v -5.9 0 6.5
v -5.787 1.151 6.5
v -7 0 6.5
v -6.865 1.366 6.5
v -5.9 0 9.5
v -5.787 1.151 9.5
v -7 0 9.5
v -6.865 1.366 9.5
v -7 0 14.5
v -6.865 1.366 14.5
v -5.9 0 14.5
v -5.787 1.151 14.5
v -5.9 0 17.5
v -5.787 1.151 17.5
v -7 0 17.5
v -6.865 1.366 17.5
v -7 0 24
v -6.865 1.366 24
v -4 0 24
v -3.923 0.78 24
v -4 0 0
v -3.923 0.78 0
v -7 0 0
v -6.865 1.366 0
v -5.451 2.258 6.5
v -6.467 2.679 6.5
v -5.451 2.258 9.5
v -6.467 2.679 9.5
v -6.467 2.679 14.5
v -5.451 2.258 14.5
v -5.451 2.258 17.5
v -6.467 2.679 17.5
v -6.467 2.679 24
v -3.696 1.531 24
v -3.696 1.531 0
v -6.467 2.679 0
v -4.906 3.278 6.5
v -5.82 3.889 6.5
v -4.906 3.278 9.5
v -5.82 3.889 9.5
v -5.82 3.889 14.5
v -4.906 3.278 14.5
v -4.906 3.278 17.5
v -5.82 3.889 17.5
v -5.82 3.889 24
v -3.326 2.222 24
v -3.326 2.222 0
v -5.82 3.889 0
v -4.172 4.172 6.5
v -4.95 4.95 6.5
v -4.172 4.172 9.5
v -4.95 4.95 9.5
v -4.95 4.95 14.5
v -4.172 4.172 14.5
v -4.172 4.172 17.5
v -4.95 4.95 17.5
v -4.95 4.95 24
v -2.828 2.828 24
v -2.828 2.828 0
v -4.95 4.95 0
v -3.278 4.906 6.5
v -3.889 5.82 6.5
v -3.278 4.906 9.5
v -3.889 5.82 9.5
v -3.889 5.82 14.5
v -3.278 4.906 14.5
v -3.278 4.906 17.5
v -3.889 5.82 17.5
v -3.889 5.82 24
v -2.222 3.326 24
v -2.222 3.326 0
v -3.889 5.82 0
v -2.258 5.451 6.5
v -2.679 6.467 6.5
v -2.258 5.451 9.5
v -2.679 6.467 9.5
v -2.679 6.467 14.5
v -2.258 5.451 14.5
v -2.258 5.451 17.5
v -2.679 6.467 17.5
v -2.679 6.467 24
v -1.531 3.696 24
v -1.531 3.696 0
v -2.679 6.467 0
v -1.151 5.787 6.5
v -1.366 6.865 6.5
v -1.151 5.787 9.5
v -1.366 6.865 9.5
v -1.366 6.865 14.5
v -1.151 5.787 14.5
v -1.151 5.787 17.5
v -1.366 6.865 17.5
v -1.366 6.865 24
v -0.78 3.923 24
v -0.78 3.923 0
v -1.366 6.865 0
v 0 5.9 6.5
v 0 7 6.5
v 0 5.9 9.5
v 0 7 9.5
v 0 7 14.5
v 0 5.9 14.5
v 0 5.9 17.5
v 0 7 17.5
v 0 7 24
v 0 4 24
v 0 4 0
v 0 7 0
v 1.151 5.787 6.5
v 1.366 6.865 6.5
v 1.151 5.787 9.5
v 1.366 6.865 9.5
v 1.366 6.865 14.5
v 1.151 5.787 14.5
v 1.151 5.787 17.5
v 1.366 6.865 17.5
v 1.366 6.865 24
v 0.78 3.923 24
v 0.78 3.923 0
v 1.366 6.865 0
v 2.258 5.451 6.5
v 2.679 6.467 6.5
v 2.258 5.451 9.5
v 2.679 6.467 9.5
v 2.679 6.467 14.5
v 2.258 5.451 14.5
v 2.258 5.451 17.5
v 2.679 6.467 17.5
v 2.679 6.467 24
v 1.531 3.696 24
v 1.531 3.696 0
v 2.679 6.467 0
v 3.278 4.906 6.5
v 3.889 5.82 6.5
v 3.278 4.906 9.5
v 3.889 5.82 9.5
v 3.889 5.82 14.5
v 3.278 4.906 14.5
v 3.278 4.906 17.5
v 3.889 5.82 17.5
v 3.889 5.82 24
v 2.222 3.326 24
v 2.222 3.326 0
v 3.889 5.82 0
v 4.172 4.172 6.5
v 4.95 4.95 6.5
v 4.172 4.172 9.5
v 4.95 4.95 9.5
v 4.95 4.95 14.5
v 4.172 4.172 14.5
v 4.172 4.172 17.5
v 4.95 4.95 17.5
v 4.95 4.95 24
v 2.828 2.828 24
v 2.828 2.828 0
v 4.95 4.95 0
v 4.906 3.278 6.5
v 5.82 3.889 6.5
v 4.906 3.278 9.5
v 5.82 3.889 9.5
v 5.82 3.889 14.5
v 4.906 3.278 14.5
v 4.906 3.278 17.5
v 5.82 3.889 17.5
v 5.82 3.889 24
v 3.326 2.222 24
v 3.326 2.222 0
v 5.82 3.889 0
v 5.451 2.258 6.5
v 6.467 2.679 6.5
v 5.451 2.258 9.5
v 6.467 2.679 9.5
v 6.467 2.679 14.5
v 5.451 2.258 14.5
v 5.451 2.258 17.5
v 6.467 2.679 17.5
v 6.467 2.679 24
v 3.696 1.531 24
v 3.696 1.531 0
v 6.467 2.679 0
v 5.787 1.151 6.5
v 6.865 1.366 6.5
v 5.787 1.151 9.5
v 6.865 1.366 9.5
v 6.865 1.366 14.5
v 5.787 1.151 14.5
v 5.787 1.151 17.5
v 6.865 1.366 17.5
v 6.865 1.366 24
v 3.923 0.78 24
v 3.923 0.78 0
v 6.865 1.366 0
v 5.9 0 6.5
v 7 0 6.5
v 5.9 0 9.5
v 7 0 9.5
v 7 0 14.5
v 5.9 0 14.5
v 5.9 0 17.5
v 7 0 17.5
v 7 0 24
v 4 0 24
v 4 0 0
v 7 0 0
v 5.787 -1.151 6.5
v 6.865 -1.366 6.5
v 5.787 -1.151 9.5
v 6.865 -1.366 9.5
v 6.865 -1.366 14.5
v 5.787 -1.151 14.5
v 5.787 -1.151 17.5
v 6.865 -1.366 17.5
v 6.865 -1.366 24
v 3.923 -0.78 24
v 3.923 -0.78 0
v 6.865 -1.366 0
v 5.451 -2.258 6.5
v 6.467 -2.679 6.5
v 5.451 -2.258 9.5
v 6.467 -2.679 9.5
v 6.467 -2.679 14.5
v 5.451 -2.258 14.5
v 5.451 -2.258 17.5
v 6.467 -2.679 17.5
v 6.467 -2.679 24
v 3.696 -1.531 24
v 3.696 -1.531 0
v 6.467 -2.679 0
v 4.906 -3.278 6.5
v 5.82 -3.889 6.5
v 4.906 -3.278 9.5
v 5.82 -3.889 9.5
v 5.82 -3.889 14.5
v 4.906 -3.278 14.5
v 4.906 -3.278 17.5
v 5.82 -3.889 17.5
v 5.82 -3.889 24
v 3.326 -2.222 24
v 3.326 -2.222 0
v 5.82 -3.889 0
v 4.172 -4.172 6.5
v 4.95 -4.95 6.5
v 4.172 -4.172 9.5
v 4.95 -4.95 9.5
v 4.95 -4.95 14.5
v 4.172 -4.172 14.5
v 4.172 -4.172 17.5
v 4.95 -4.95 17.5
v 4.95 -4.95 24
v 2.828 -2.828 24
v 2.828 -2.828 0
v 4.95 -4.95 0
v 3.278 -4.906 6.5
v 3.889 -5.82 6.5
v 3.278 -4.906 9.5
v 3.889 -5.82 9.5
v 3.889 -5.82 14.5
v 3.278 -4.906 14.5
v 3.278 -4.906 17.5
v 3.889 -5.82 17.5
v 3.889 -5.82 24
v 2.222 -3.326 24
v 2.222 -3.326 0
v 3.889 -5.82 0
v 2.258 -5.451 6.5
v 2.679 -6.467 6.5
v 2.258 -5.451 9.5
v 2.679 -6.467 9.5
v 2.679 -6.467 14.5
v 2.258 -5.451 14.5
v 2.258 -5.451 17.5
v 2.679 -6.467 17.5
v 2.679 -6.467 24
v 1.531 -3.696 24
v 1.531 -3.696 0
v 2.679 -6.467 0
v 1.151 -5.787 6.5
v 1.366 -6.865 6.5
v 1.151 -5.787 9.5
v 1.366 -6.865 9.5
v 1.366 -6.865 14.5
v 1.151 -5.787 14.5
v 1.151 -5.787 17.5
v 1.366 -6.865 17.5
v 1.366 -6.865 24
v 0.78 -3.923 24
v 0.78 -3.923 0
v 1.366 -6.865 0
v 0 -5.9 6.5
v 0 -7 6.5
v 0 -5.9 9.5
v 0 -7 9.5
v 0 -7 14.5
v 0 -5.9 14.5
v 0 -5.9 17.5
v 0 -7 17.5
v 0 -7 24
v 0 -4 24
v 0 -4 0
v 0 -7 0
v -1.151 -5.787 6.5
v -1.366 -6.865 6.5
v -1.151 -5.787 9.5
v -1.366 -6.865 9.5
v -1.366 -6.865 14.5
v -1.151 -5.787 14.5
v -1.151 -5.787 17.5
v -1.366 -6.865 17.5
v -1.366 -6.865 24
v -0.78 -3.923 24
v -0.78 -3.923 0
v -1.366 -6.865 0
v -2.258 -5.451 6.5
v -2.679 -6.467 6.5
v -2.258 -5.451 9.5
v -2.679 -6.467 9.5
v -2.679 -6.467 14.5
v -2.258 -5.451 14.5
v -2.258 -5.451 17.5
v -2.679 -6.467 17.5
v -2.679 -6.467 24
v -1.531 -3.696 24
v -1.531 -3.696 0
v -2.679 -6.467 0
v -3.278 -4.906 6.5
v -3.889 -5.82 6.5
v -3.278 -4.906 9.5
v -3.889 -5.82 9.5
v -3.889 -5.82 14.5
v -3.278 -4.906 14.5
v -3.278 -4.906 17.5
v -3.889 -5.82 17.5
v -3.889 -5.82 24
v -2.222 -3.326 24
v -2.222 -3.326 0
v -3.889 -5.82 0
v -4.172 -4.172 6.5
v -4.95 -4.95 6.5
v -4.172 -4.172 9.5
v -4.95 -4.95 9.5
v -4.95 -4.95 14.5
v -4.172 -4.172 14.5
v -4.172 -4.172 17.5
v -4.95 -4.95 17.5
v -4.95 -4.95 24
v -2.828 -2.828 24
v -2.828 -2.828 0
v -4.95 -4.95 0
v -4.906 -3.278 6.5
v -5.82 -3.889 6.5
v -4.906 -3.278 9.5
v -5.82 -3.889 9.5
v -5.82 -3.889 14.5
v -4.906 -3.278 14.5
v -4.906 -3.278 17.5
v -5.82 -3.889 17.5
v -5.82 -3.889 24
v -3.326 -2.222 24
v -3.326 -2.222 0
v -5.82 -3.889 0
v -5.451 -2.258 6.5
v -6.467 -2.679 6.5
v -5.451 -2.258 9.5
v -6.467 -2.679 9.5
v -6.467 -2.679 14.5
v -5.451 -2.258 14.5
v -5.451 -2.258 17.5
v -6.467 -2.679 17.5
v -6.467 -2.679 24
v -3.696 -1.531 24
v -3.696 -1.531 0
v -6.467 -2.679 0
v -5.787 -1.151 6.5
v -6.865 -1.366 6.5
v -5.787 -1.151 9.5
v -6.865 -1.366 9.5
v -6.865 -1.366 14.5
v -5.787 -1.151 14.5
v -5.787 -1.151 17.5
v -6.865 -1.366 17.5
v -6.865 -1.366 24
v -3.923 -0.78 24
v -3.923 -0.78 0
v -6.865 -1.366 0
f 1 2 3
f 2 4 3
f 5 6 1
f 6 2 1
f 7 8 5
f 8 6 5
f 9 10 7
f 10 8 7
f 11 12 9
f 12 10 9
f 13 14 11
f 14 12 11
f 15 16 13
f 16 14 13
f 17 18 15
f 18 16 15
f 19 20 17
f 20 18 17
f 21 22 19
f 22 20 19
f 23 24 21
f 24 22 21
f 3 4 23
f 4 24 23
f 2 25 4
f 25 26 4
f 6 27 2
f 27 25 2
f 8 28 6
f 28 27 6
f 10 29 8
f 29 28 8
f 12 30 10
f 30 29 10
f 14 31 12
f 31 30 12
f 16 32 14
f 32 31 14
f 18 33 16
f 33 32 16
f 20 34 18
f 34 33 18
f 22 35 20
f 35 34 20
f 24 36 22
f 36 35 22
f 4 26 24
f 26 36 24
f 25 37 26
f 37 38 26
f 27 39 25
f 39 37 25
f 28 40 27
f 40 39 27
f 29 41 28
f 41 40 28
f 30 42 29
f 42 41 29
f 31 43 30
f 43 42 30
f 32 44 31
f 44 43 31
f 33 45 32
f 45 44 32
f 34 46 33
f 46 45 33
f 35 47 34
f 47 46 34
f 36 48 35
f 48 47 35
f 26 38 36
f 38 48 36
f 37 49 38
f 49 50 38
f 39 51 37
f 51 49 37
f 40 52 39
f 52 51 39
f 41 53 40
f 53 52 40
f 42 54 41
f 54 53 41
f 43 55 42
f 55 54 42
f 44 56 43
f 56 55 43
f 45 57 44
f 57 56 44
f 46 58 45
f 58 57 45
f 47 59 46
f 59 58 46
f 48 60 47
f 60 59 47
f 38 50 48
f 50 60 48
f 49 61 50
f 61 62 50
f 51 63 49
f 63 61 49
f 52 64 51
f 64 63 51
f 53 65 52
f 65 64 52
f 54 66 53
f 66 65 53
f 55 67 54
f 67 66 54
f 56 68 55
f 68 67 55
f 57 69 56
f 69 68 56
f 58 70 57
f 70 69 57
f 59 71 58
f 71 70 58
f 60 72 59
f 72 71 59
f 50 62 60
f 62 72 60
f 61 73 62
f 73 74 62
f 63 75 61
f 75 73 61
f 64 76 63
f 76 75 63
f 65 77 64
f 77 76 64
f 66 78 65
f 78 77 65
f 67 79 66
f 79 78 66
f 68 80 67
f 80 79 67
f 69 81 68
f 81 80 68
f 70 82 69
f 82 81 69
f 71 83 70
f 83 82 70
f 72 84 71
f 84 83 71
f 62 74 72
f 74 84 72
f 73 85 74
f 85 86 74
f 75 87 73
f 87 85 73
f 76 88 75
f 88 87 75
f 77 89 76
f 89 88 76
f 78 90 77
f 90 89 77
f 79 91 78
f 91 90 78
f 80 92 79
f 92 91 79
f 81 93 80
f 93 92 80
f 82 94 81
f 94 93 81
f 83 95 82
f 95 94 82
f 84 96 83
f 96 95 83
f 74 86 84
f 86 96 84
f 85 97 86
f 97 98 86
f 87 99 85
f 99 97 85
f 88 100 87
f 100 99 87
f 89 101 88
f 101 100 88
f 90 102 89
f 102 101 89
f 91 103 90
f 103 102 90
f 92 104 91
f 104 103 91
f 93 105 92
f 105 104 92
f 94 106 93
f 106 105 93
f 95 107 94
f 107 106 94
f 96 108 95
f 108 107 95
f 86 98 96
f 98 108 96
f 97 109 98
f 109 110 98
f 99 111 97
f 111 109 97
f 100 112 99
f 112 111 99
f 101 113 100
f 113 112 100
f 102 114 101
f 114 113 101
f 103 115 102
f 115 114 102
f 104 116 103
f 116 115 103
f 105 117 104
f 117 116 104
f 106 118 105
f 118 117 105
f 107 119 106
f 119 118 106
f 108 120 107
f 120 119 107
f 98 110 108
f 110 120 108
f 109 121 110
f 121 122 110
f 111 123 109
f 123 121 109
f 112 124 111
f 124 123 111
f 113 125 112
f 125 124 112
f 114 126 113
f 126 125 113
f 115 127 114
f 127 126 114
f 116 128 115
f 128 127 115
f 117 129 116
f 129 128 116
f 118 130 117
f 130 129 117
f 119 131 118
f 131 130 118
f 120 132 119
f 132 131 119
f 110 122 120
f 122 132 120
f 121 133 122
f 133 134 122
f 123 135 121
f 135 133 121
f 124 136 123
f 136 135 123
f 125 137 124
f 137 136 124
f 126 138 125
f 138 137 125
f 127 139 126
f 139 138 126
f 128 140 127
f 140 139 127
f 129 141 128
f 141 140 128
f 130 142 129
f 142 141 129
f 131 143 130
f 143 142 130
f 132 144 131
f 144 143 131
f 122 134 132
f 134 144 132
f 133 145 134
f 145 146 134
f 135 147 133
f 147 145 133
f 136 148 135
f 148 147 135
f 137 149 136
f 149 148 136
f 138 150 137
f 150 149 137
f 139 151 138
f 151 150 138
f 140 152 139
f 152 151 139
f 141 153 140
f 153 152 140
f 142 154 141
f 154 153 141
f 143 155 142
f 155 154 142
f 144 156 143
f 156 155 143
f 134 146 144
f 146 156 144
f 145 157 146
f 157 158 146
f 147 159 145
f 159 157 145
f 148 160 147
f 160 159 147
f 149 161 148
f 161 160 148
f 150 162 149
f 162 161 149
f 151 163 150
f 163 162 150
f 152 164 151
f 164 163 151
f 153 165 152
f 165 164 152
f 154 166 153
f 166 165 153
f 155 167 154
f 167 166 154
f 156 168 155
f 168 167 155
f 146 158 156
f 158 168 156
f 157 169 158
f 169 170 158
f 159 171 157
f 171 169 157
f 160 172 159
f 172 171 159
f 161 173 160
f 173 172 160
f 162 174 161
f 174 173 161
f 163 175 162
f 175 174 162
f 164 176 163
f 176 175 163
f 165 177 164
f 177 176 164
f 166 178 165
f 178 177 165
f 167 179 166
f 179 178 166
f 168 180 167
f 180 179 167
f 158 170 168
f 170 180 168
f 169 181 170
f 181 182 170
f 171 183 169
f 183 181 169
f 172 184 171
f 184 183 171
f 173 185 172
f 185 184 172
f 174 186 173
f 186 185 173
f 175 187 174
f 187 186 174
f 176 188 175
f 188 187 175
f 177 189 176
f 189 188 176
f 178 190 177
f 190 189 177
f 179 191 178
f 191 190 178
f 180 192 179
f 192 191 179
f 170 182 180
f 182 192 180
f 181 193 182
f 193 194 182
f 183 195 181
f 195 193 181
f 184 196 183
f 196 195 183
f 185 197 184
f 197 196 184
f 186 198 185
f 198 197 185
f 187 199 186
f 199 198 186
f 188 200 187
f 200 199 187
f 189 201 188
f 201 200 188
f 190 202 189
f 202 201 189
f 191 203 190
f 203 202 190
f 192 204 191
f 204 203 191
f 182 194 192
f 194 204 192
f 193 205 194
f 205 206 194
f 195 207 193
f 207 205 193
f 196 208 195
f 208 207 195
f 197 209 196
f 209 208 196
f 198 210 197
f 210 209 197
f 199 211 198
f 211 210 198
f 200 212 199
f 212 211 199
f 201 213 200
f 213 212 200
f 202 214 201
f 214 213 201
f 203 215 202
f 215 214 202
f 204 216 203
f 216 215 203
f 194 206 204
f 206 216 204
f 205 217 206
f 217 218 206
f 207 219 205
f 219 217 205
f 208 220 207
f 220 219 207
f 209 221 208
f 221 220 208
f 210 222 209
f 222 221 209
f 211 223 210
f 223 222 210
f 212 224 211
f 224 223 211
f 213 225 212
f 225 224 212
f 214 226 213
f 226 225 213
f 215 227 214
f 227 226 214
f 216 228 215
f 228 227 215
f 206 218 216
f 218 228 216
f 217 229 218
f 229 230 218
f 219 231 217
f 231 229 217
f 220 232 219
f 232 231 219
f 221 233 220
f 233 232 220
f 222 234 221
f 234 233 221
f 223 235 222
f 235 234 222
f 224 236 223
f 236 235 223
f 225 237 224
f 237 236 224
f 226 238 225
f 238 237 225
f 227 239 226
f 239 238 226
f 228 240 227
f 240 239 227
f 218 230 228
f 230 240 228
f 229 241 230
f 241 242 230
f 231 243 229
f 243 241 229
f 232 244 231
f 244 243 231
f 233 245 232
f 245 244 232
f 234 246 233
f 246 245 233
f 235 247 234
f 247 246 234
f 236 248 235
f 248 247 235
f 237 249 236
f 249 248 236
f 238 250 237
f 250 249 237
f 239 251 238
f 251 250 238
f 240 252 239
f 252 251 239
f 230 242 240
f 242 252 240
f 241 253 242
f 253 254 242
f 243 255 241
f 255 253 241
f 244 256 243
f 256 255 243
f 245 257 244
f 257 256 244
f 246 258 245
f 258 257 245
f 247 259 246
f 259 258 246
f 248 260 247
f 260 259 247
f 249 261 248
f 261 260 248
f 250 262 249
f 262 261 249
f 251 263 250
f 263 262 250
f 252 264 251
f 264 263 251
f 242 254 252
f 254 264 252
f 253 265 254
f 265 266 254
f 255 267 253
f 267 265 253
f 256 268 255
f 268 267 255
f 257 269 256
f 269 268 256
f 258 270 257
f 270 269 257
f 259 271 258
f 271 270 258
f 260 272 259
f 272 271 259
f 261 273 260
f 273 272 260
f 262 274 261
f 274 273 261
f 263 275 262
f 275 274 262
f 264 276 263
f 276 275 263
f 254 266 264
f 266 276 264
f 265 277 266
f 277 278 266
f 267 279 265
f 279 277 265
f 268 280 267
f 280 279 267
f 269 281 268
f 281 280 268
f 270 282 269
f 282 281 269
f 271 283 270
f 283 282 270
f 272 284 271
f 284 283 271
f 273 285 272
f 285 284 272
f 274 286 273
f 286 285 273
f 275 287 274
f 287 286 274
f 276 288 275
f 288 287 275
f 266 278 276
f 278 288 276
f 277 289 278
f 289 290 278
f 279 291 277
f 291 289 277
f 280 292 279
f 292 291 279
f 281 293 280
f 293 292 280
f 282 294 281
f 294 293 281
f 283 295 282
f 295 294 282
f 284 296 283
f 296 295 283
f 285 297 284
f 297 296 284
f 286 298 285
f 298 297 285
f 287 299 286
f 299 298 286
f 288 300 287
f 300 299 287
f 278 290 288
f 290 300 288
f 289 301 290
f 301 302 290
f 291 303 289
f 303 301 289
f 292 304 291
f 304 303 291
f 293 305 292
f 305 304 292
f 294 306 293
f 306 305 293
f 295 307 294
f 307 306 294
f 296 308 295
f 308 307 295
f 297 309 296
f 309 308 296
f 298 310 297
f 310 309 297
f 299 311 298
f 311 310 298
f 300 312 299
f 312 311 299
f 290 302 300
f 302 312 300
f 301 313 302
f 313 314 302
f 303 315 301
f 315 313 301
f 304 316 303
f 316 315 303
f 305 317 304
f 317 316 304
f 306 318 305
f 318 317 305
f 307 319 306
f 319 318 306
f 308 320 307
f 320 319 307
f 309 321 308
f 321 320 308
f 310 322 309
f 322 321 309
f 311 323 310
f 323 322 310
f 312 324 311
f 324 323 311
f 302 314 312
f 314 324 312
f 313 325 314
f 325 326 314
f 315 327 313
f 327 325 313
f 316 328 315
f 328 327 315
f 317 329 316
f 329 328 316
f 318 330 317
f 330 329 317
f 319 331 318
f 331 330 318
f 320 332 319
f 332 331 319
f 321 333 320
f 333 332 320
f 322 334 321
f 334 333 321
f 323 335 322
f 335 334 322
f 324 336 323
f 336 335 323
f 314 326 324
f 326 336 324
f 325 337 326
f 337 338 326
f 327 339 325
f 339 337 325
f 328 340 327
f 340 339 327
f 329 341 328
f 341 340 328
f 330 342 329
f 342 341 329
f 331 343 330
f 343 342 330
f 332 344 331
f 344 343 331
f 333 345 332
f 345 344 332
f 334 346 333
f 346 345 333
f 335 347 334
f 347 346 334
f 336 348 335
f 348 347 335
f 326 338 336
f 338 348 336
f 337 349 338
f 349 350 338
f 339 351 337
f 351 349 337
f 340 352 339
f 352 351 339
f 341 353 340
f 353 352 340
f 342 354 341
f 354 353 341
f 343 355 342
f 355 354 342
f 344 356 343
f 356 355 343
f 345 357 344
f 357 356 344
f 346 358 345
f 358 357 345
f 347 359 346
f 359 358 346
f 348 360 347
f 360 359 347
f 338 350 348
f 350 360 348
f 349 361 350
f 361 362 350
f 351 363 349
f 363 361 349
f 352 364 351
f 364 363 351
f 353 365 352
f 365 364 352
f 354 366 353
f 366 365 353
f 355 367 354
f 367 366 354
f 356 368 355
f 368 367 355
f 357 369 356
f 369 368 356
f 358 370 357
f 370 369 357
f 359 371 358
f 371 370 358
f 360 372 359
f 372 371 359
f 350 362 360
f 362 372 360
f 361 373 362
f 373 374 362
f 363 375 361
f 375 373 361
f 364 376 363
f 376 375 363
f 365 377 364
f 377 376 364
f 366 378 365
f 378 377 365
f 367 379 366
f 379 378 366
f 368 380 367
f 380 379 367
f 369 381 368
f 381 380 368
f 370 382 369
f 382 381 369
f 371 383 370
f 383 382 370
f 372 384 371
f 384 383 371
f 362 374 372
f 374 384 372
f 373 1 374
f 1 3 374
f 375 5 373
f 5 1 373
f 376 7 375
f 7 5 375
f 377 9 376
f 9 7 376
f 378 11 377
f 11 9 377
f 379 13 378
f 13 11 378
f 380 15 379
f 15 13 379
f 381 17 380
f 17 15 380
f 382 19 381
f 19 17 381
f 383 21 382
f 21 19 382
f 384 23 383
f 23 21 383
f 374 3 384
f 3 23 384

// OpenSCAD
$fn = 32;

// ----------------------------------------------------------------------
// Grooved revolve: stepped, bore R4
// ----------------------------------------------------------------------

// --- parameters (mm) ---
bore_r = 4;               // bore radius
outer_r = 7;              // outer radius of the body
total_h = 24;             // overall height, Z
wall = 3;                 // radial wall thickness
groove_w = 3;             // groove width
groove_d = 1.1;           // groove depth
grooves = 2;              // number of outer grooves

bbox_x = 2 * outer_r;  // full diameter
bore_d = 2 * bore_r;  // bore diameter
body_d = 2 * outer_r;  // body diameter
revolve_angle = 360;  // full turn around the Z axis

profile = [[4, 0], [7, 0], [7, 6.5], [5.9, 6.5], [5.9, 9.5], [7, 9.5], [7, 14.5], [5.9, 14.5], [5.9, 17.5], [7, 17.5], [7, 24], [4, 24]];  // primary outline, 12 points, counter clockwise

// --- the one profile operation ---
rotate_extrude(angle = revolve_angle) polygon(points = profile);
